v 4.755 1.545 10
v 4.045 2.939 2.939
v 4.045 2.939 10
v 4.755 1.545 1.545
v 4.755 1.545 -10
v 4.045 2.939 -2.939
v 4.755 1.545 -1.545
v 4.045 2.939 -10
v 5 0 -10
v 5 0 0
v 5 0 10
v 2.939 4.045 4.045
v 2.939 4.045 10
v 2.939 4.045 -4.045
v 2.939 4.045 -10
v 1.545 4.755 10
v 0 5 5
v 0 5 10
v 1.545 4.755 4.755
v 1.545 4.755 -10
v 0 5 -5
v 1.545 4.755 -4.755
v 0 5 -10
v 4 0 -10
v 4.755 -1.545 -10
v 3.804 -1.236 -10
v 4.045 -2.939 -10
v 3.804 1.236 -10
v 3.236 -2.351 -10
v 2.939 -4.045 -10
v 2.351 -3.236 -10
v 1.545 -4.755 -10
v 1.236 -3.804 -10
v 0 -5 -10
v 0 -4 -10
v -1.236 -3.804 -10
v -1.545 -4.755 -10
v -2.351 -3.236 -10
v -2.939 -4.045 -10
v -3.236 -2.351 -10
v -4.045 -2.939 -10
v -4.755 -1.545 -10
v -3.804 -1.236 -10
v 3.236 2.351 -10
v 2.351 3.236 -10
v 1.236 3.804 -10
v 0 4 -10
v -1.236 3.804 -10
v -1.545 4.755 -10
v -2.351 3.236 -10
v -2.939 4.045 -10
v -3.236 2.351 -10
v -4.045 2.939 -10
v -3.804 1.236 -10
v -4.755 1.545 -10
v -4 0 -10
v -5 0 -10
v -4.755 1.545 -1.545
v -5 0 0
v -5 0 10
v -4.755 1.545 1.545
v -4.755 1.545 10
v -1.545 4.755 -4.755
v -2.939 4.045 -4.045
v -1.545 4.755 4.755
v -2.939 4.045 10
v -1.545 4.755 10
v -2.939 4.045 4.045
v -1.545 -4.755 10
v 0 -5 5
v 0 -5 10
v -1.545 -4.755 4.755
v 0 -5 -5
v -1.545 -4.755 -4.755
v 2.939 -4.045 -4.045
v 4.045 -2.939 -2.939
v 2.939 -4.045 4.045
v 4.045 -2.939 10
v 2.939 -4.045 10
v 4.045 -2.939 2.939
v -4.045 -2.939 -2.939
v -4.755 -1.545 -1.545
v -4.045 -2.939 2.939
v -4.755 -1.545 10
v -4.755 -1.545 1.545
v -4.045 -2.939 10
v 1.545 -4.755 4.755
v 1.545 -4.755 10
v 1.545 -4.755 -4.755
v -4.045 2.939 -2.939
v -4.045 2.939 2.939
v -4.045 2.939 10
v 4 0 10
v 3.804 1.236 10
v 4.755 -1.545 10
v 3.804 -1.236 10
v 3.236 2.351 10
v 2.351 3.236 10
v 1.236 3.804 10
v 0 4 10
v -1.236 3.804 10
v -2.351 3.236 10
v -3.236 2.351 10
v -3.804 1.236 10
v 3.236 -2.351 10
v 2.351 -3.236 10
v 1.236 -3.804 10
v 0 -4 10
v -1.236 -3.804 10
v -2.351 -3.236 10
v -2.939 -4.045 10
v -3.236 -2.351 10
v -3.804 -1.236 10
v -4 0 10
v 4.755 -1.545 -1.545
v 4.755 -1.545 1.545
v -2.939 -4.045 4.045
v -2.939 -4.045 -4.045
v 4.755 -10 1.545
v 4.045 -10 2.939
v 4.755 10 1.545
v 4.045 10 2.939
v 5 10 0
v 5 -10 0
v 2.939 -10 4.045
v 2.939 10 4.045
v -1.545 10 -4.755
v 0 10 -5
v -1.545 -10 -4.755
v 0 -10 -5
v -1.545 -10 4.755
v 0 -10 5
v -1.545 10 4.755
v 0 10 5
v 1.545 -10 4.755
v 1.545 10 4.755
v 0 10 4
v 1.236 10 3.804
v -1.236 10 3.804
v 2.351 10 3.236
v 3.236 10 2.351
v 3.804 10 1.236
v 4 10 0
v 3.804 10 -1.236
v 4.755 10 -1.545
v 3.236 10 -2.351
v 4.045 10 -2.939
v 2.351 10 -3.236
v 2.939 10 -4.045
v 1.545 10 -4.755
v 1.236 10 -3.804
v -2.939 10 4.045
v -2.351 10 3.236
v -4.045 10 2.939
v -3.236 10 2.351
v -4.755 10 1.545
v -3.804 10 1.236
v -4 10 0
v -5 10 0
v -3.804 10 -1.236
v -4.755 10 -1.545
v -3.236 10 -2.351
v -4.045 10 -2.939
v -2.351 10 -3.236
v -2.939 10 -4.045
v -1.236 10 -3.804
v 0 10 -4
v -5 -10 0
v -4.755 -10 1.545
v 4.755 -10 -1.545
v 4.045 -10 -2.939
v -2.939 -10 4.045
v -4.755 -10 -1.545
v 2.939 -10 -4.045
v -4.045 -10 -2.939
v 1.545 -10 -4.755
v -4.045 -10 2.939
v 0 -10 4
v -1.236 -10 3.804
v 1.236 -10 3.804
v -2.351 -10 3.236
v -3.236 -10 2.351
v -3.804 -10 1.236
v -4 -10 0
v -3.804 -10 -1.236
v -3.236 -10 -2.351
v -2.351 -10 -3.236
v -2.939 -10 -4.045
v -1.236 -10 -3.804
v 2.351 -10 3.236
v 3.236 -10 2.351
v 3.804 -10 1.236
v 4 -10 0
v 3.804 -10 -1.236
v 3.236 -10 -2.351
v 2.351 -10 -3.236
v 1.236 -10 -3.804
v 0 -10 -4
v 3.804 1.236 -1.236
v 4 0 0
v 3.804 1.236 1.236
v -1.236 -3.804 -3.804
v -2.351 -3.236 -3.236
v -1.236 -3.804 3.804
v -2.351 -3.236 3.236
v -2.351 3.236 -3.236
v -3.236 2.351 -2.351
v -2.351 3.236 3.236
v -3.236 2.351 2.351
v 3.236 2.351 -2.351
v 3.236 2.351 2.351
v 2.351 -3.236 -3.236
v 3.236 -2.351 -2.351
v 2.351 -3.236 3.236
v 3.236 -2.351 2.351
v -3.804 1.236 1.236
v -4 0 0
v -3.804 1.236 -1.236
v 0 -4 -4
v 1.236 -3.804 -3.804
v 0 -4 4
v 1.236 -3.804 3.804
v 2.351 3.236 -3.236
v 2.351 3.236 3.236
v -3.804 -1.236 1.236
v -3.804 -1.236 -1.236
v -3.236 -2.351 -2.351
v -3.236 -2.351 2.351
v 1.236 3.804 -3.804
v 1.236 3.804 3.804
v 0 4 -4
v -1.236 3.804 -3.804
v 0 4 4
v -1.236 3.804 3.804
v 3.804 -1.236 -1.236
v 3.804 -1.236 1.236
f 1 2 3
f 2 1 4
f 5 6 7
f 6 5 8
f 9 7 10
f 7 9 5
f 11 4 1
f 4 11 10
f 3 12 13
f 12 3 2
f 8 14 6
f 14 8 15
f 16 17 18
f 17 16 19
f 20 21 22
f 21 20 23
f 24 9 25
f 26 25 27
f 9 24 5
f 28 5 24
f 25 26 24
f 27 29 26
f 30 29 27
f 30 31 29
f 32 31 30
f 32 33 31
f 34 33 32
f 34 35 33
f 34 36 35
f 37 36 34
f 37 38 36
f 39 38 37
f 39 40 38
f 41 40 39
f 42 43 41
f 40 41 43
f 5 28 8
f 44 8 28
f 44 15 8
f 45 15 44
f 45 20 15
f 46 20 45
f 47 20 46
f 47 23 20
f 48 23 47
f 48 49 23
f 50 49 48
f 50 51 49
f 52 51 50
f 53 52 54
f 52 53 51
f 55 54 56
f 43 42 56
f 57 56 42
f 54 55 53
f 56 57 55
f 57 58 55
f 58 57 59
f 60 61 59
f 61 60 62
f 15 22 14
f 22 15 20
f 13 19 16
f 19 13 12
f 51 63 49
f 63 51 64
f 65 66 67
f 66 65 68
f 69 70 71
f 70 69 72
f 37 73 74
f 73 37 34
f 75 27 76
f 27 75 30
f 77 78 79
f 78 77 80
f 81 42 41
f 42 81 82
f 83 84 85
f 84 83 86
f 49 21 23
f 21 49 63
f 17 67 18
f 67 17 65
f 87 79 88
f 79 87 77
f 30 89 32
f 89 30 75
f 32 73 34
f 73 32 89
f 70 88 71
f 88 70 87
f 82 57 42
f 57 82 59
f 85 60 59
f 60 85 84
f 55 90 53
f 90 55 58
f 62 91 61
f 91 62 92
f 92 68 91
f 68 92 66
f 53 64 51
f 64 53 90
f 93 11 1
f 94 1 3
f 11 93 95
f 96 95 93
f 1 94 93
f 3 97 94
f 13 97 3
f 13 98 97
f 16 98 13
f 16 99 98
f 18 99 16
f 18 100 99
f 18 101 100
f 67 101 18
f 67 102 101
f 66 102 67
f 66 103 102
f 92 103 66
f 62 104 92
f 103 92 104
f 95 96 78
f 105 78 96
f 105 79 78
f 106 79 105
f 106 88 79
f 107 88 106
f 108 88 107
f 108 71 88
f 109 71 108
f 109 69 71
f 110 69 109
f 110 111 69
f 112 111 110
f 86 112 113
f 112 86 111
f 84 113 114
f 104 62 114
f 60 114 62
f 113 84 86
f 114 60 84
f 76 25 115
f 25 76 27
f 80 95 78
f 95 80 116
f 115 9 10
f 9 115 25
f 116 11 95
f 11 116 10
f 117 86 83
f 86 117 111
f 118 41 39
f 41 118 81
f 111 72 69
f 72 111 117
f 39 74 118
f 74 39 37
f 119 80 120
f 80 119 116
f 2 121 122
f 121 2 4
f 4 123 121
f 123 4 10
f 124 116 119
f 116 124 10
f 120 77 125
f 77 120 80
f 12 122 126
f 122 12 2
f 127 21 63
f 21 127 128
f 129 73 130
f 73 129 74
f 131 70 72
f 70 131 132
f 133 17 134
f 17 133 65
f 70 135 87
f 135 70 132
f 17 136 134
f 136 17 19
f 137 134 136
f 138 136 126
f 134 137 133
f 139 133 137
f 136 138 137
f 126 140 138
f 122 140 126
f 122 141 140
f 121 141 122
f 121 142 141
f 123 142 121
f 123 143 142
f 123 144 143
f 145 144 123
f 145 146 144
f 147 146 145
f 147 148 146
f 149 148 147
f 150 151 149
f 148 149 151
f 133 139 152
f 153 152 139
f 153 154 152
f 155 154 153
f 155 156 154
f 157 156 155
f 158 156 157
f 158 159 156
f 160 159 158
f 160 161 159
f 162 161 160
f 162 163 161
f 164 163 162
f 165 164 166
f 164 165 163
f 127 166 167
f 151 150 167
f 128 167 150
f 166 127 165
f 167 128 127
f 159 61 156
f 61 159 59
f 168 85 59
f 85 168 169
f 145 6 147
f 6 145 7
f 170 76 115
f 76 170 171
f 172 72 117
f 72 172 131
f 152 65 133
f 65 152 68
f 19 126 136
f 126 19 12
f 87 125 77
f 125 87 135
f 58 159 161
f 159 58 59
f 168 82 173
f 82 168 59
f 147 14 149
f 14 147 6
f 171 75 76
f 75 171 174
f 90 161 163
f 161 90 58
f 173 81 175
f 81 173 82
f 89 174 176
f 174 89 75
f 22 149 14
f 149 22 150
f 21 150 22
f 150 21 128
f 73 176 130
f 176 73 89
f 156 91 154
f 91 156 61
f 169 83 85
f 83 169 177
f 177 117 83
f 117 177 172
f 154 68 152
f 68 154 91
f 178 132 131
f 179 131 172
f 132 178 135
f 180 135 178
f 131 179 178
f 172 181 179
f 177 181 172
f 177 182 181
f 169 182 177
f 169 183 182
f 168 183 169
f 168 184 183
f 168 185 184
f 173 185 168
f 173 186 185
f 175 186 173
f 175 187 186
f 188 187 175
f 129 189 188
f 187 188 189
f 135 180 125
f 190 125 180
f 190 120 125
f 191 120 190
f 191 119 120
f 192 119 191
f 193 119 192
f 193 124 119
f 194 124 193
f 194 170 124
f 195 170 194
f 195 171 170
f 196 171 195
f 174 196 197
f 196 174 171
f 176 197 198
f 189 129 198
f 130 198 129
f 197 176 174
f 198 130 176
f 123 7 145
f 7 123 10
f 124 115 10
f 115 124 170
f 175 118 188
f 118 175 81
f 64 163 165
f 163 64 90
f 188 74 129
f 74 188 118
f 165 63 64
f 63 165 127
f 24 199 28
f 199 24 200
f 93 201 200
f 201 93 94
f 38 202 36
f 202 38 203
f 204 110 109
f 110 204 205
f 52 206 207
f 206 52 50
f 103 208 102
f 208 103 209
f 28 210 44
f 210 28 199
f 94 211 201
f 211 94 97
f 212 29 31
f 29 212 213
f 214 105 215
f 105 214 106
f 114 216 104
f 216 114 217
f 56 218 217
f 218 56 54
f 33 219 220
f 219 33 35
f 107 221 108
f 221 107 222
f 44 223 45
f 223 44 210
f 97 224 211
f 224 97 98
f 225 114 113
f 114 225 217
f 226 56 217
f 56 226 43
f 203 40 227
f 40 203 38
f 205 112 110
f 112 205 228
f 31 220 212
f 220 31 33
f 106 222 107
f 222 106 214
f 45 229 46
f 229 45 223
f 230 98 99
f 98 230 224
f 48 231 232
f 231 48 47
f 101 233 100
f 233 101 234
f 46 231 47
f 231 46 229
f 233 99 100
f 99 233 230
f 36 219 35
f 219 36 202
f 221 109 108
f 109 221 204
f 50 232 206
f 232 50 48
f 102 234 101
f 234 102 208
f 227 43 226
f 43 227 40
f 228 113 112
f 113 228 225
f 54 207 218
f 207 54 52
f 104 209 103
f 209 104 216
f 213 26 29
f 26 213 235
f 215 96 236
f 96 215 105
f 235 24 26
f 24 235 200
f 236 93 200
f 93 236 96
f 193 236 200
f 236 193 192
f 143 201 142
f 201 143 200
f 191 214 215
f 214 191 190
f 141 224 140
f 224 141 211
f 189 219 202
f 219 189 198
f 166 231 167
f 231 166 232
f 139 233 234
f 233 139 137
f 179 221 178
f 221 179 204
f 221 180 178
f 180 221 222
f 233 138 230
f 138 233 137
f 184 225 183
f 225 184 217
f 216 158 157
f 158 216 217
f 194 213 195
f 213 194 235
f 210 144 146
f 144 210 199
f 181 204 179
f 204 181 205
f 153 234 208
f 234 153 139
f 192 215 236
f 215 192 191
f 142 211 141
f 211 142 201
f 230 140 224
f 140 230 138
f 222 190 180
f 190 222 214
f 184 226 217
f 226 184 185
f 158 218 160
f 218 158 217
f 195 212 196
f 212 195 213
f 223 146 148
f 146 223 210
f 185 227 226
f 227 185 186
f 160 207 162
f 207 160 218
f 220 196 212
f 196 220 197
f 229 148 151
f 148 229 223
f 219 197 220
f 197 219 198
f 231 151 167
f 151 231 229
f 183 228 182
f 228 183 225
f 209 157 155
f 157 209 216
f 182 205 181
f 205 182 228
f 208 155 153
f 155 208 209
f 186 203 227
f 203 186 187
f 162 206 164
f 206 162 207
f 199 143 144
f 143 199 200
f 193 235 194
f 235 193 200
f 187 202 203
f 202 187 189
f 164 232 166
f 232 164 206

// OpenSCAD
$fn = 20;

difference() {
union() {
    cylinder(h=20, r=5, center=true);
    rotate([90, 0, 0])cylinder(h=20, r=5, center=true);

}

union() {
    cylinder(h=21, r=4, center=true);
    rotate([90, 0, 0])cylinder(h=21, r=4, center=true);

}
}
